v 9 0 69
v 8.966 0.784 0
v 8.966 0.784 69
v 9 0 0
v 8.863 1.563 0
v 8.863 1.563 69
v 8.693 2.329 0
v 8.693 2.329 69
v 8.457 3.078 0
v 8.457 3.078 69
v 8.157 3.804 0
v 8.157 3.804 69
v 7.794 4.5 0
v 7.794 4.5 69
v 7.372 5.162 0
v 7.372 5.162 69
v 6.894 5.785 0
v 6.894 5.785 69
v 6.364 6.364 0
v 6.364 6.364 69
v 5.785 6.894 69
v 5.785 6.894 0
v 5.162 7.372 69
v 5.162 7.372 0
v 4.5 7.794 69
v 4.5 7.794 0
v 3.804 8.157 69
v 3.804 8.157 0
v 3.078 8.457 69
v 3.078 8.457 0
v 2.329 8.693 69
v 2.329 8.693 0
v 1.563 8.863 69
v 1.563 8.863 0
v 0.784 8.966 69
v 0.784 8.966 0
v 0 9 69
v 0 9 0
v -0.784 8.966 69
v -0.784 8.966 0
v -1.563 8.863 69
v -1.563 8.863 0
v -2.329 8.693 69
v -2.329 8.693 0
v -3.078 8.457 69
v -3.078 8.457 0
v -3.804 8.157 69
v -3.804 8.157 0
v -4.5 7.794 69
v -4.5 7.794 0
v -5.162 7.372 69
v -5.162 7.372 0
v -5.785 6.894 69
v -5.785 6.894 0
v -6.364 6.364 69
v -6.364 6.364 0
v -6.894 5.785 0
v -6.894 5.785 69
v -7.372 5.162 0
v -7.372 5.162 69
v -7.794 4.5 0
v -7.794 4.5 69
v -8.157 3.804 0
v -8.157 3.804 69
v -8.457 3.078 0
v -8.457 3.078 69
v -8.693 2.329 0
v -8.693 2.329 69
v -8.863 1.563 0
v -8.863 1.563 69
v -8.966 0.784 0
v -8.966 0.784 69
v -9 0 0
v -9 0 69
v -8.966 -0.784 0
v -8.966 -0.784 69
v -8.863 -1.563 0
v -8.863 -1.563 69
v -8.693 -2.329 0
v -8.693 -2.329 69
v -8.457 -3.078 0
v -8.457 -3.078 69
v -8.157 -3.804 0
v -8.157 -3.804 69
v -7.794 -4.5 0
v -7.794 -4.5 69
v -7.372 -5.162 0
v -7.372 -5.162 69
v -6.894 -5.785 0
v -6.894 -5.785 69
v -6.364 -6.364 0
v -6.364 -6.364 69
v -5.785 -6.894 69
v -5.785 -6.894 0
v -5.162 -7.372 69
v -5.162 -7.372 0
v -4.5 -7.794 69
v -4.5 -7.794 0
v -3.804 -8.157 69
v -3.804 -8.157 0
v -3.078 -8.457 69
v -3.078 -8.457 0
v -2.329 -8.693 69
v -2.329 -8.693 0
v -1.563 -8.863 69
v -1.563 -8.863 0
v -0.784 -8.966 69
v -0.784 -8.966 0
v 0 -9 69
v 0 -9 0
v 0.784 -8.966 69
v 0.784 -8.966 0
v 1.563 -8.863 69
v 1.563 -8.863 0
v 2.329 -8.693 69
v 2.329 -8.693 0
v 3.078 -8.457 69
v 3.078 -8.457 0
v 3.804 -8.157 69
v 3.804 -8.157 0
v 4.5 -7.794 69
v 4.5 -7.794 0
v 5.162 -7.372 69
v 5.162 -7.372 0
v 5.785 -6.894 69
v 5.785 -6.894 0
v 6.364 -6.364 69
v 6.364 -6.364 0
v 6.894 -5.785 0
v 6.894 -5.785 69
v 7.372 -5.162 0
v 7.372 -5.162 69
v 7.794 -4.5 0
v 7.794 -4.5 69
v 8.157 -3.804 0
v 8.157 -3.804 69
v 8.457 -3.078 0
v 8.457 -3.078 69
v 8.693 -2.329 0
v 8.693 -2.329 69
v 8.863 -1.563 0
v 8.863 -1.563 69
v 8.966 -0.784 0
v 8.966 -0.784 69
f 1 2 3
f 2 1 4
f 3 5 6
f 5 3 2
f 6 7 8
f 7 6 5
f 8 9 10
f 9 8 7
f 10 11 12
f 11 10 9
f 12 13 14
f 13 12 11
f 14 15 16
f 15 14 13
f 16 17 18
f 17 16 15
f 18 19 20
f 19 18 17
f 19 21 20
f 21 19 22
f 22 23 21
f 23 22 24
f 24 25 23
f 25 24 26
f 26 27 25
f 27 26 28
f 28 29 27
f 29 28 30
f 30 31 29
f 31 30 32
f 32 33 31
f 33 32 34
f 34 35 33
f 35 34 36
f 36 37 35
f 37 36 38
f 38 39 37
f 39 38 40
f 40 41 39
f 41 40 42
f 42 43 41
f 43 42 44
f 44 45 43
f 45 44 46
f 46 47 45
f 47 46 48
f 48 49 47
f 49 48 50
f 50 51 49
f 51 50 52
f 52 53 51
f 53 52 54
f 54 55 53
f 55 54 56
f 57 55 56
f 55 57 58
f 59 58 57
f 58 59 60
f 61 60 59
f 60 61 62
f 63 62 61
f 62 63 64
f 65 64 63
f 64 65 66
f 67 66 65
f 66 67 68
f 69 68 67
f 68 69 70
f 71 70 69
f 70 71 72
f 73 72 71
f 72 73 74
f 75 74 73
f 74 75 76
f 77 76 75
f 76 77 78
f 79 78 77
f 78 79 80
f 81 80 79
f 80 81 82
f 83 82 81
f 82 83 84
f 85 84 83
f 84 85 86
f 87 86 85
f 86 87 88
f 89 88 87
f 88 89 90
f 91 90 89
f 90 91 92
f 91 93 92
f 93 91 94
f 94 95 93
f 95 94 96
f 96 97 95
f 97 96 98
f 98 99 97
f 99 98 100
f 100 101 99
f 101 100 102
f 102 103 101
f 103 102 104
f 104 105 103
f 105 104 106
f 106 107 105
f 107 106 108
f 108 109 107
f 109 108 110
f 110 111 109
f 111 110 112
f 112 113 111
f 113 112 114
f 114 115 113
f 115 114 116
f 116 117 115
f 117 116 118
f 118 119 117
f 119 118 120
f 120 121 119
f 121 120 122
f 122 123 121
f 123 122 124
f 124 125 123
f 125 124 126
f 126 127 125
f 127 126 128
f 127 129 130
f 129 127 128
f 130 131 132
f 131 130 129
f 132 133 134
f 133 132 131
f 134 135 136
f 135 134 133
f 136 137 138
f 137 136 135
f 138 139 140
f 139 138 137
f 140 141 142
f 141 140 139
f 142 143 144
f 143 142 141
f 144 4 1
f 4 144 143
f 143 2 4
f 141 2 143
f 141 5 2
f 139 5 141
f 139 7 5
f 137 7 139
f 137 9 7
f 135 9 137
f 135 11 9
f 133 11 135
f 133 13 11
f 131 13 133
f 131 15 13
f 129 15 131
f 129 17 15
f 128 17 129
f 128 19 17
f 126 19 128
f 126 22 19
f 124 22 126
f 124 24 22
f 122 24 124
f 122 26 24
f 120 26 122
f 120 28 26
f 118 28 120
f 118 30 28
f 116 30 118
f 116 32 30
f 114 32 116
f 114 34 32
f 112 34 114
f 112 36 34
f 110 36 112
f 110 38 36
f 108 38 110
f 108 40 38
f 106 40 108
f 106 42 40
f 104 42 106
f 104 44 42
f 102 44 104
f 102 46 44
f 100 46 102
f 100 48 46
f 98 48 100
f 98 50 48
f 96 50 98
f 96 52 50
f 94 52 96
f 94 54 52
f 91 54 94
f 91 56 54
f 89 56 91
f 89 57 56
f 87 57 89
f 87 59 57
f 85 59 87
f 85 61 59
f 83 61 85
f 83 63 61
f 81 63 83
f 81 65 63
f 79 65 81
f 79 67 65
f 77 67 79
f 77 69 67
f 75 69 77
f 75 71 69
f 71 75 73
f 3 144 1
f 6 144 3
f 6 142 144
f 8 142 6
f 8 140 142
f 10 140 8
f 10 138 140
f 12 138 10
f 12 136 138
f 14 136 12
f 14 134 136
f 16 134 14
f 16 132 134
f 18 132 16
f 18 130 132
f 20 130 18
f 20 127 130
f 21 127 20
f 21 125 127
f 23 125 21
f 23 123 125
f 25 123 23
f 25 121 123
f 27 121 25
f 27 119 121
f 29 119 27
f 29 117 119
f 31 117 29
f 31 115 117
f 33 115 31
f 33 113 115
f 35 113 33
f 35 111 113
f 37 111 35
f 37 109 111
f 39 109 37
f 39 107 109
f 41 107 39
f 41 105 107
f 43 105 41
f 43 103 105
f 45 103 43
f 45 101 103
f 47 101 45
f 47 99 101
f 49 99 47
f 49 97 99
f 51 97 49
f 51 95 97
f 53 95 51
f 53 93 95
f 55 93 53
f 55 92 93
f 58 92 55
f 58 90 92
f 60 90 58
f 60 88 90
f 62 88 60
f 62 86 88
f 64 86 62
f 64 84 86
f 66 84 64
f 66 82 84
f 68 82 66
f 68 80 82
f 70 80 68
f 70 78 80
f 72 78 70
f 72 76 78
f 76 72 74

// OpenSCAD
$fn = 72;

Adafruit_1781();

// Lithium Ion Cylindrical Battery - 3.7v 2200mAh
module Adafruit_1781()
{
    color("blue")
    cylinder(h=69, d=18);
}
